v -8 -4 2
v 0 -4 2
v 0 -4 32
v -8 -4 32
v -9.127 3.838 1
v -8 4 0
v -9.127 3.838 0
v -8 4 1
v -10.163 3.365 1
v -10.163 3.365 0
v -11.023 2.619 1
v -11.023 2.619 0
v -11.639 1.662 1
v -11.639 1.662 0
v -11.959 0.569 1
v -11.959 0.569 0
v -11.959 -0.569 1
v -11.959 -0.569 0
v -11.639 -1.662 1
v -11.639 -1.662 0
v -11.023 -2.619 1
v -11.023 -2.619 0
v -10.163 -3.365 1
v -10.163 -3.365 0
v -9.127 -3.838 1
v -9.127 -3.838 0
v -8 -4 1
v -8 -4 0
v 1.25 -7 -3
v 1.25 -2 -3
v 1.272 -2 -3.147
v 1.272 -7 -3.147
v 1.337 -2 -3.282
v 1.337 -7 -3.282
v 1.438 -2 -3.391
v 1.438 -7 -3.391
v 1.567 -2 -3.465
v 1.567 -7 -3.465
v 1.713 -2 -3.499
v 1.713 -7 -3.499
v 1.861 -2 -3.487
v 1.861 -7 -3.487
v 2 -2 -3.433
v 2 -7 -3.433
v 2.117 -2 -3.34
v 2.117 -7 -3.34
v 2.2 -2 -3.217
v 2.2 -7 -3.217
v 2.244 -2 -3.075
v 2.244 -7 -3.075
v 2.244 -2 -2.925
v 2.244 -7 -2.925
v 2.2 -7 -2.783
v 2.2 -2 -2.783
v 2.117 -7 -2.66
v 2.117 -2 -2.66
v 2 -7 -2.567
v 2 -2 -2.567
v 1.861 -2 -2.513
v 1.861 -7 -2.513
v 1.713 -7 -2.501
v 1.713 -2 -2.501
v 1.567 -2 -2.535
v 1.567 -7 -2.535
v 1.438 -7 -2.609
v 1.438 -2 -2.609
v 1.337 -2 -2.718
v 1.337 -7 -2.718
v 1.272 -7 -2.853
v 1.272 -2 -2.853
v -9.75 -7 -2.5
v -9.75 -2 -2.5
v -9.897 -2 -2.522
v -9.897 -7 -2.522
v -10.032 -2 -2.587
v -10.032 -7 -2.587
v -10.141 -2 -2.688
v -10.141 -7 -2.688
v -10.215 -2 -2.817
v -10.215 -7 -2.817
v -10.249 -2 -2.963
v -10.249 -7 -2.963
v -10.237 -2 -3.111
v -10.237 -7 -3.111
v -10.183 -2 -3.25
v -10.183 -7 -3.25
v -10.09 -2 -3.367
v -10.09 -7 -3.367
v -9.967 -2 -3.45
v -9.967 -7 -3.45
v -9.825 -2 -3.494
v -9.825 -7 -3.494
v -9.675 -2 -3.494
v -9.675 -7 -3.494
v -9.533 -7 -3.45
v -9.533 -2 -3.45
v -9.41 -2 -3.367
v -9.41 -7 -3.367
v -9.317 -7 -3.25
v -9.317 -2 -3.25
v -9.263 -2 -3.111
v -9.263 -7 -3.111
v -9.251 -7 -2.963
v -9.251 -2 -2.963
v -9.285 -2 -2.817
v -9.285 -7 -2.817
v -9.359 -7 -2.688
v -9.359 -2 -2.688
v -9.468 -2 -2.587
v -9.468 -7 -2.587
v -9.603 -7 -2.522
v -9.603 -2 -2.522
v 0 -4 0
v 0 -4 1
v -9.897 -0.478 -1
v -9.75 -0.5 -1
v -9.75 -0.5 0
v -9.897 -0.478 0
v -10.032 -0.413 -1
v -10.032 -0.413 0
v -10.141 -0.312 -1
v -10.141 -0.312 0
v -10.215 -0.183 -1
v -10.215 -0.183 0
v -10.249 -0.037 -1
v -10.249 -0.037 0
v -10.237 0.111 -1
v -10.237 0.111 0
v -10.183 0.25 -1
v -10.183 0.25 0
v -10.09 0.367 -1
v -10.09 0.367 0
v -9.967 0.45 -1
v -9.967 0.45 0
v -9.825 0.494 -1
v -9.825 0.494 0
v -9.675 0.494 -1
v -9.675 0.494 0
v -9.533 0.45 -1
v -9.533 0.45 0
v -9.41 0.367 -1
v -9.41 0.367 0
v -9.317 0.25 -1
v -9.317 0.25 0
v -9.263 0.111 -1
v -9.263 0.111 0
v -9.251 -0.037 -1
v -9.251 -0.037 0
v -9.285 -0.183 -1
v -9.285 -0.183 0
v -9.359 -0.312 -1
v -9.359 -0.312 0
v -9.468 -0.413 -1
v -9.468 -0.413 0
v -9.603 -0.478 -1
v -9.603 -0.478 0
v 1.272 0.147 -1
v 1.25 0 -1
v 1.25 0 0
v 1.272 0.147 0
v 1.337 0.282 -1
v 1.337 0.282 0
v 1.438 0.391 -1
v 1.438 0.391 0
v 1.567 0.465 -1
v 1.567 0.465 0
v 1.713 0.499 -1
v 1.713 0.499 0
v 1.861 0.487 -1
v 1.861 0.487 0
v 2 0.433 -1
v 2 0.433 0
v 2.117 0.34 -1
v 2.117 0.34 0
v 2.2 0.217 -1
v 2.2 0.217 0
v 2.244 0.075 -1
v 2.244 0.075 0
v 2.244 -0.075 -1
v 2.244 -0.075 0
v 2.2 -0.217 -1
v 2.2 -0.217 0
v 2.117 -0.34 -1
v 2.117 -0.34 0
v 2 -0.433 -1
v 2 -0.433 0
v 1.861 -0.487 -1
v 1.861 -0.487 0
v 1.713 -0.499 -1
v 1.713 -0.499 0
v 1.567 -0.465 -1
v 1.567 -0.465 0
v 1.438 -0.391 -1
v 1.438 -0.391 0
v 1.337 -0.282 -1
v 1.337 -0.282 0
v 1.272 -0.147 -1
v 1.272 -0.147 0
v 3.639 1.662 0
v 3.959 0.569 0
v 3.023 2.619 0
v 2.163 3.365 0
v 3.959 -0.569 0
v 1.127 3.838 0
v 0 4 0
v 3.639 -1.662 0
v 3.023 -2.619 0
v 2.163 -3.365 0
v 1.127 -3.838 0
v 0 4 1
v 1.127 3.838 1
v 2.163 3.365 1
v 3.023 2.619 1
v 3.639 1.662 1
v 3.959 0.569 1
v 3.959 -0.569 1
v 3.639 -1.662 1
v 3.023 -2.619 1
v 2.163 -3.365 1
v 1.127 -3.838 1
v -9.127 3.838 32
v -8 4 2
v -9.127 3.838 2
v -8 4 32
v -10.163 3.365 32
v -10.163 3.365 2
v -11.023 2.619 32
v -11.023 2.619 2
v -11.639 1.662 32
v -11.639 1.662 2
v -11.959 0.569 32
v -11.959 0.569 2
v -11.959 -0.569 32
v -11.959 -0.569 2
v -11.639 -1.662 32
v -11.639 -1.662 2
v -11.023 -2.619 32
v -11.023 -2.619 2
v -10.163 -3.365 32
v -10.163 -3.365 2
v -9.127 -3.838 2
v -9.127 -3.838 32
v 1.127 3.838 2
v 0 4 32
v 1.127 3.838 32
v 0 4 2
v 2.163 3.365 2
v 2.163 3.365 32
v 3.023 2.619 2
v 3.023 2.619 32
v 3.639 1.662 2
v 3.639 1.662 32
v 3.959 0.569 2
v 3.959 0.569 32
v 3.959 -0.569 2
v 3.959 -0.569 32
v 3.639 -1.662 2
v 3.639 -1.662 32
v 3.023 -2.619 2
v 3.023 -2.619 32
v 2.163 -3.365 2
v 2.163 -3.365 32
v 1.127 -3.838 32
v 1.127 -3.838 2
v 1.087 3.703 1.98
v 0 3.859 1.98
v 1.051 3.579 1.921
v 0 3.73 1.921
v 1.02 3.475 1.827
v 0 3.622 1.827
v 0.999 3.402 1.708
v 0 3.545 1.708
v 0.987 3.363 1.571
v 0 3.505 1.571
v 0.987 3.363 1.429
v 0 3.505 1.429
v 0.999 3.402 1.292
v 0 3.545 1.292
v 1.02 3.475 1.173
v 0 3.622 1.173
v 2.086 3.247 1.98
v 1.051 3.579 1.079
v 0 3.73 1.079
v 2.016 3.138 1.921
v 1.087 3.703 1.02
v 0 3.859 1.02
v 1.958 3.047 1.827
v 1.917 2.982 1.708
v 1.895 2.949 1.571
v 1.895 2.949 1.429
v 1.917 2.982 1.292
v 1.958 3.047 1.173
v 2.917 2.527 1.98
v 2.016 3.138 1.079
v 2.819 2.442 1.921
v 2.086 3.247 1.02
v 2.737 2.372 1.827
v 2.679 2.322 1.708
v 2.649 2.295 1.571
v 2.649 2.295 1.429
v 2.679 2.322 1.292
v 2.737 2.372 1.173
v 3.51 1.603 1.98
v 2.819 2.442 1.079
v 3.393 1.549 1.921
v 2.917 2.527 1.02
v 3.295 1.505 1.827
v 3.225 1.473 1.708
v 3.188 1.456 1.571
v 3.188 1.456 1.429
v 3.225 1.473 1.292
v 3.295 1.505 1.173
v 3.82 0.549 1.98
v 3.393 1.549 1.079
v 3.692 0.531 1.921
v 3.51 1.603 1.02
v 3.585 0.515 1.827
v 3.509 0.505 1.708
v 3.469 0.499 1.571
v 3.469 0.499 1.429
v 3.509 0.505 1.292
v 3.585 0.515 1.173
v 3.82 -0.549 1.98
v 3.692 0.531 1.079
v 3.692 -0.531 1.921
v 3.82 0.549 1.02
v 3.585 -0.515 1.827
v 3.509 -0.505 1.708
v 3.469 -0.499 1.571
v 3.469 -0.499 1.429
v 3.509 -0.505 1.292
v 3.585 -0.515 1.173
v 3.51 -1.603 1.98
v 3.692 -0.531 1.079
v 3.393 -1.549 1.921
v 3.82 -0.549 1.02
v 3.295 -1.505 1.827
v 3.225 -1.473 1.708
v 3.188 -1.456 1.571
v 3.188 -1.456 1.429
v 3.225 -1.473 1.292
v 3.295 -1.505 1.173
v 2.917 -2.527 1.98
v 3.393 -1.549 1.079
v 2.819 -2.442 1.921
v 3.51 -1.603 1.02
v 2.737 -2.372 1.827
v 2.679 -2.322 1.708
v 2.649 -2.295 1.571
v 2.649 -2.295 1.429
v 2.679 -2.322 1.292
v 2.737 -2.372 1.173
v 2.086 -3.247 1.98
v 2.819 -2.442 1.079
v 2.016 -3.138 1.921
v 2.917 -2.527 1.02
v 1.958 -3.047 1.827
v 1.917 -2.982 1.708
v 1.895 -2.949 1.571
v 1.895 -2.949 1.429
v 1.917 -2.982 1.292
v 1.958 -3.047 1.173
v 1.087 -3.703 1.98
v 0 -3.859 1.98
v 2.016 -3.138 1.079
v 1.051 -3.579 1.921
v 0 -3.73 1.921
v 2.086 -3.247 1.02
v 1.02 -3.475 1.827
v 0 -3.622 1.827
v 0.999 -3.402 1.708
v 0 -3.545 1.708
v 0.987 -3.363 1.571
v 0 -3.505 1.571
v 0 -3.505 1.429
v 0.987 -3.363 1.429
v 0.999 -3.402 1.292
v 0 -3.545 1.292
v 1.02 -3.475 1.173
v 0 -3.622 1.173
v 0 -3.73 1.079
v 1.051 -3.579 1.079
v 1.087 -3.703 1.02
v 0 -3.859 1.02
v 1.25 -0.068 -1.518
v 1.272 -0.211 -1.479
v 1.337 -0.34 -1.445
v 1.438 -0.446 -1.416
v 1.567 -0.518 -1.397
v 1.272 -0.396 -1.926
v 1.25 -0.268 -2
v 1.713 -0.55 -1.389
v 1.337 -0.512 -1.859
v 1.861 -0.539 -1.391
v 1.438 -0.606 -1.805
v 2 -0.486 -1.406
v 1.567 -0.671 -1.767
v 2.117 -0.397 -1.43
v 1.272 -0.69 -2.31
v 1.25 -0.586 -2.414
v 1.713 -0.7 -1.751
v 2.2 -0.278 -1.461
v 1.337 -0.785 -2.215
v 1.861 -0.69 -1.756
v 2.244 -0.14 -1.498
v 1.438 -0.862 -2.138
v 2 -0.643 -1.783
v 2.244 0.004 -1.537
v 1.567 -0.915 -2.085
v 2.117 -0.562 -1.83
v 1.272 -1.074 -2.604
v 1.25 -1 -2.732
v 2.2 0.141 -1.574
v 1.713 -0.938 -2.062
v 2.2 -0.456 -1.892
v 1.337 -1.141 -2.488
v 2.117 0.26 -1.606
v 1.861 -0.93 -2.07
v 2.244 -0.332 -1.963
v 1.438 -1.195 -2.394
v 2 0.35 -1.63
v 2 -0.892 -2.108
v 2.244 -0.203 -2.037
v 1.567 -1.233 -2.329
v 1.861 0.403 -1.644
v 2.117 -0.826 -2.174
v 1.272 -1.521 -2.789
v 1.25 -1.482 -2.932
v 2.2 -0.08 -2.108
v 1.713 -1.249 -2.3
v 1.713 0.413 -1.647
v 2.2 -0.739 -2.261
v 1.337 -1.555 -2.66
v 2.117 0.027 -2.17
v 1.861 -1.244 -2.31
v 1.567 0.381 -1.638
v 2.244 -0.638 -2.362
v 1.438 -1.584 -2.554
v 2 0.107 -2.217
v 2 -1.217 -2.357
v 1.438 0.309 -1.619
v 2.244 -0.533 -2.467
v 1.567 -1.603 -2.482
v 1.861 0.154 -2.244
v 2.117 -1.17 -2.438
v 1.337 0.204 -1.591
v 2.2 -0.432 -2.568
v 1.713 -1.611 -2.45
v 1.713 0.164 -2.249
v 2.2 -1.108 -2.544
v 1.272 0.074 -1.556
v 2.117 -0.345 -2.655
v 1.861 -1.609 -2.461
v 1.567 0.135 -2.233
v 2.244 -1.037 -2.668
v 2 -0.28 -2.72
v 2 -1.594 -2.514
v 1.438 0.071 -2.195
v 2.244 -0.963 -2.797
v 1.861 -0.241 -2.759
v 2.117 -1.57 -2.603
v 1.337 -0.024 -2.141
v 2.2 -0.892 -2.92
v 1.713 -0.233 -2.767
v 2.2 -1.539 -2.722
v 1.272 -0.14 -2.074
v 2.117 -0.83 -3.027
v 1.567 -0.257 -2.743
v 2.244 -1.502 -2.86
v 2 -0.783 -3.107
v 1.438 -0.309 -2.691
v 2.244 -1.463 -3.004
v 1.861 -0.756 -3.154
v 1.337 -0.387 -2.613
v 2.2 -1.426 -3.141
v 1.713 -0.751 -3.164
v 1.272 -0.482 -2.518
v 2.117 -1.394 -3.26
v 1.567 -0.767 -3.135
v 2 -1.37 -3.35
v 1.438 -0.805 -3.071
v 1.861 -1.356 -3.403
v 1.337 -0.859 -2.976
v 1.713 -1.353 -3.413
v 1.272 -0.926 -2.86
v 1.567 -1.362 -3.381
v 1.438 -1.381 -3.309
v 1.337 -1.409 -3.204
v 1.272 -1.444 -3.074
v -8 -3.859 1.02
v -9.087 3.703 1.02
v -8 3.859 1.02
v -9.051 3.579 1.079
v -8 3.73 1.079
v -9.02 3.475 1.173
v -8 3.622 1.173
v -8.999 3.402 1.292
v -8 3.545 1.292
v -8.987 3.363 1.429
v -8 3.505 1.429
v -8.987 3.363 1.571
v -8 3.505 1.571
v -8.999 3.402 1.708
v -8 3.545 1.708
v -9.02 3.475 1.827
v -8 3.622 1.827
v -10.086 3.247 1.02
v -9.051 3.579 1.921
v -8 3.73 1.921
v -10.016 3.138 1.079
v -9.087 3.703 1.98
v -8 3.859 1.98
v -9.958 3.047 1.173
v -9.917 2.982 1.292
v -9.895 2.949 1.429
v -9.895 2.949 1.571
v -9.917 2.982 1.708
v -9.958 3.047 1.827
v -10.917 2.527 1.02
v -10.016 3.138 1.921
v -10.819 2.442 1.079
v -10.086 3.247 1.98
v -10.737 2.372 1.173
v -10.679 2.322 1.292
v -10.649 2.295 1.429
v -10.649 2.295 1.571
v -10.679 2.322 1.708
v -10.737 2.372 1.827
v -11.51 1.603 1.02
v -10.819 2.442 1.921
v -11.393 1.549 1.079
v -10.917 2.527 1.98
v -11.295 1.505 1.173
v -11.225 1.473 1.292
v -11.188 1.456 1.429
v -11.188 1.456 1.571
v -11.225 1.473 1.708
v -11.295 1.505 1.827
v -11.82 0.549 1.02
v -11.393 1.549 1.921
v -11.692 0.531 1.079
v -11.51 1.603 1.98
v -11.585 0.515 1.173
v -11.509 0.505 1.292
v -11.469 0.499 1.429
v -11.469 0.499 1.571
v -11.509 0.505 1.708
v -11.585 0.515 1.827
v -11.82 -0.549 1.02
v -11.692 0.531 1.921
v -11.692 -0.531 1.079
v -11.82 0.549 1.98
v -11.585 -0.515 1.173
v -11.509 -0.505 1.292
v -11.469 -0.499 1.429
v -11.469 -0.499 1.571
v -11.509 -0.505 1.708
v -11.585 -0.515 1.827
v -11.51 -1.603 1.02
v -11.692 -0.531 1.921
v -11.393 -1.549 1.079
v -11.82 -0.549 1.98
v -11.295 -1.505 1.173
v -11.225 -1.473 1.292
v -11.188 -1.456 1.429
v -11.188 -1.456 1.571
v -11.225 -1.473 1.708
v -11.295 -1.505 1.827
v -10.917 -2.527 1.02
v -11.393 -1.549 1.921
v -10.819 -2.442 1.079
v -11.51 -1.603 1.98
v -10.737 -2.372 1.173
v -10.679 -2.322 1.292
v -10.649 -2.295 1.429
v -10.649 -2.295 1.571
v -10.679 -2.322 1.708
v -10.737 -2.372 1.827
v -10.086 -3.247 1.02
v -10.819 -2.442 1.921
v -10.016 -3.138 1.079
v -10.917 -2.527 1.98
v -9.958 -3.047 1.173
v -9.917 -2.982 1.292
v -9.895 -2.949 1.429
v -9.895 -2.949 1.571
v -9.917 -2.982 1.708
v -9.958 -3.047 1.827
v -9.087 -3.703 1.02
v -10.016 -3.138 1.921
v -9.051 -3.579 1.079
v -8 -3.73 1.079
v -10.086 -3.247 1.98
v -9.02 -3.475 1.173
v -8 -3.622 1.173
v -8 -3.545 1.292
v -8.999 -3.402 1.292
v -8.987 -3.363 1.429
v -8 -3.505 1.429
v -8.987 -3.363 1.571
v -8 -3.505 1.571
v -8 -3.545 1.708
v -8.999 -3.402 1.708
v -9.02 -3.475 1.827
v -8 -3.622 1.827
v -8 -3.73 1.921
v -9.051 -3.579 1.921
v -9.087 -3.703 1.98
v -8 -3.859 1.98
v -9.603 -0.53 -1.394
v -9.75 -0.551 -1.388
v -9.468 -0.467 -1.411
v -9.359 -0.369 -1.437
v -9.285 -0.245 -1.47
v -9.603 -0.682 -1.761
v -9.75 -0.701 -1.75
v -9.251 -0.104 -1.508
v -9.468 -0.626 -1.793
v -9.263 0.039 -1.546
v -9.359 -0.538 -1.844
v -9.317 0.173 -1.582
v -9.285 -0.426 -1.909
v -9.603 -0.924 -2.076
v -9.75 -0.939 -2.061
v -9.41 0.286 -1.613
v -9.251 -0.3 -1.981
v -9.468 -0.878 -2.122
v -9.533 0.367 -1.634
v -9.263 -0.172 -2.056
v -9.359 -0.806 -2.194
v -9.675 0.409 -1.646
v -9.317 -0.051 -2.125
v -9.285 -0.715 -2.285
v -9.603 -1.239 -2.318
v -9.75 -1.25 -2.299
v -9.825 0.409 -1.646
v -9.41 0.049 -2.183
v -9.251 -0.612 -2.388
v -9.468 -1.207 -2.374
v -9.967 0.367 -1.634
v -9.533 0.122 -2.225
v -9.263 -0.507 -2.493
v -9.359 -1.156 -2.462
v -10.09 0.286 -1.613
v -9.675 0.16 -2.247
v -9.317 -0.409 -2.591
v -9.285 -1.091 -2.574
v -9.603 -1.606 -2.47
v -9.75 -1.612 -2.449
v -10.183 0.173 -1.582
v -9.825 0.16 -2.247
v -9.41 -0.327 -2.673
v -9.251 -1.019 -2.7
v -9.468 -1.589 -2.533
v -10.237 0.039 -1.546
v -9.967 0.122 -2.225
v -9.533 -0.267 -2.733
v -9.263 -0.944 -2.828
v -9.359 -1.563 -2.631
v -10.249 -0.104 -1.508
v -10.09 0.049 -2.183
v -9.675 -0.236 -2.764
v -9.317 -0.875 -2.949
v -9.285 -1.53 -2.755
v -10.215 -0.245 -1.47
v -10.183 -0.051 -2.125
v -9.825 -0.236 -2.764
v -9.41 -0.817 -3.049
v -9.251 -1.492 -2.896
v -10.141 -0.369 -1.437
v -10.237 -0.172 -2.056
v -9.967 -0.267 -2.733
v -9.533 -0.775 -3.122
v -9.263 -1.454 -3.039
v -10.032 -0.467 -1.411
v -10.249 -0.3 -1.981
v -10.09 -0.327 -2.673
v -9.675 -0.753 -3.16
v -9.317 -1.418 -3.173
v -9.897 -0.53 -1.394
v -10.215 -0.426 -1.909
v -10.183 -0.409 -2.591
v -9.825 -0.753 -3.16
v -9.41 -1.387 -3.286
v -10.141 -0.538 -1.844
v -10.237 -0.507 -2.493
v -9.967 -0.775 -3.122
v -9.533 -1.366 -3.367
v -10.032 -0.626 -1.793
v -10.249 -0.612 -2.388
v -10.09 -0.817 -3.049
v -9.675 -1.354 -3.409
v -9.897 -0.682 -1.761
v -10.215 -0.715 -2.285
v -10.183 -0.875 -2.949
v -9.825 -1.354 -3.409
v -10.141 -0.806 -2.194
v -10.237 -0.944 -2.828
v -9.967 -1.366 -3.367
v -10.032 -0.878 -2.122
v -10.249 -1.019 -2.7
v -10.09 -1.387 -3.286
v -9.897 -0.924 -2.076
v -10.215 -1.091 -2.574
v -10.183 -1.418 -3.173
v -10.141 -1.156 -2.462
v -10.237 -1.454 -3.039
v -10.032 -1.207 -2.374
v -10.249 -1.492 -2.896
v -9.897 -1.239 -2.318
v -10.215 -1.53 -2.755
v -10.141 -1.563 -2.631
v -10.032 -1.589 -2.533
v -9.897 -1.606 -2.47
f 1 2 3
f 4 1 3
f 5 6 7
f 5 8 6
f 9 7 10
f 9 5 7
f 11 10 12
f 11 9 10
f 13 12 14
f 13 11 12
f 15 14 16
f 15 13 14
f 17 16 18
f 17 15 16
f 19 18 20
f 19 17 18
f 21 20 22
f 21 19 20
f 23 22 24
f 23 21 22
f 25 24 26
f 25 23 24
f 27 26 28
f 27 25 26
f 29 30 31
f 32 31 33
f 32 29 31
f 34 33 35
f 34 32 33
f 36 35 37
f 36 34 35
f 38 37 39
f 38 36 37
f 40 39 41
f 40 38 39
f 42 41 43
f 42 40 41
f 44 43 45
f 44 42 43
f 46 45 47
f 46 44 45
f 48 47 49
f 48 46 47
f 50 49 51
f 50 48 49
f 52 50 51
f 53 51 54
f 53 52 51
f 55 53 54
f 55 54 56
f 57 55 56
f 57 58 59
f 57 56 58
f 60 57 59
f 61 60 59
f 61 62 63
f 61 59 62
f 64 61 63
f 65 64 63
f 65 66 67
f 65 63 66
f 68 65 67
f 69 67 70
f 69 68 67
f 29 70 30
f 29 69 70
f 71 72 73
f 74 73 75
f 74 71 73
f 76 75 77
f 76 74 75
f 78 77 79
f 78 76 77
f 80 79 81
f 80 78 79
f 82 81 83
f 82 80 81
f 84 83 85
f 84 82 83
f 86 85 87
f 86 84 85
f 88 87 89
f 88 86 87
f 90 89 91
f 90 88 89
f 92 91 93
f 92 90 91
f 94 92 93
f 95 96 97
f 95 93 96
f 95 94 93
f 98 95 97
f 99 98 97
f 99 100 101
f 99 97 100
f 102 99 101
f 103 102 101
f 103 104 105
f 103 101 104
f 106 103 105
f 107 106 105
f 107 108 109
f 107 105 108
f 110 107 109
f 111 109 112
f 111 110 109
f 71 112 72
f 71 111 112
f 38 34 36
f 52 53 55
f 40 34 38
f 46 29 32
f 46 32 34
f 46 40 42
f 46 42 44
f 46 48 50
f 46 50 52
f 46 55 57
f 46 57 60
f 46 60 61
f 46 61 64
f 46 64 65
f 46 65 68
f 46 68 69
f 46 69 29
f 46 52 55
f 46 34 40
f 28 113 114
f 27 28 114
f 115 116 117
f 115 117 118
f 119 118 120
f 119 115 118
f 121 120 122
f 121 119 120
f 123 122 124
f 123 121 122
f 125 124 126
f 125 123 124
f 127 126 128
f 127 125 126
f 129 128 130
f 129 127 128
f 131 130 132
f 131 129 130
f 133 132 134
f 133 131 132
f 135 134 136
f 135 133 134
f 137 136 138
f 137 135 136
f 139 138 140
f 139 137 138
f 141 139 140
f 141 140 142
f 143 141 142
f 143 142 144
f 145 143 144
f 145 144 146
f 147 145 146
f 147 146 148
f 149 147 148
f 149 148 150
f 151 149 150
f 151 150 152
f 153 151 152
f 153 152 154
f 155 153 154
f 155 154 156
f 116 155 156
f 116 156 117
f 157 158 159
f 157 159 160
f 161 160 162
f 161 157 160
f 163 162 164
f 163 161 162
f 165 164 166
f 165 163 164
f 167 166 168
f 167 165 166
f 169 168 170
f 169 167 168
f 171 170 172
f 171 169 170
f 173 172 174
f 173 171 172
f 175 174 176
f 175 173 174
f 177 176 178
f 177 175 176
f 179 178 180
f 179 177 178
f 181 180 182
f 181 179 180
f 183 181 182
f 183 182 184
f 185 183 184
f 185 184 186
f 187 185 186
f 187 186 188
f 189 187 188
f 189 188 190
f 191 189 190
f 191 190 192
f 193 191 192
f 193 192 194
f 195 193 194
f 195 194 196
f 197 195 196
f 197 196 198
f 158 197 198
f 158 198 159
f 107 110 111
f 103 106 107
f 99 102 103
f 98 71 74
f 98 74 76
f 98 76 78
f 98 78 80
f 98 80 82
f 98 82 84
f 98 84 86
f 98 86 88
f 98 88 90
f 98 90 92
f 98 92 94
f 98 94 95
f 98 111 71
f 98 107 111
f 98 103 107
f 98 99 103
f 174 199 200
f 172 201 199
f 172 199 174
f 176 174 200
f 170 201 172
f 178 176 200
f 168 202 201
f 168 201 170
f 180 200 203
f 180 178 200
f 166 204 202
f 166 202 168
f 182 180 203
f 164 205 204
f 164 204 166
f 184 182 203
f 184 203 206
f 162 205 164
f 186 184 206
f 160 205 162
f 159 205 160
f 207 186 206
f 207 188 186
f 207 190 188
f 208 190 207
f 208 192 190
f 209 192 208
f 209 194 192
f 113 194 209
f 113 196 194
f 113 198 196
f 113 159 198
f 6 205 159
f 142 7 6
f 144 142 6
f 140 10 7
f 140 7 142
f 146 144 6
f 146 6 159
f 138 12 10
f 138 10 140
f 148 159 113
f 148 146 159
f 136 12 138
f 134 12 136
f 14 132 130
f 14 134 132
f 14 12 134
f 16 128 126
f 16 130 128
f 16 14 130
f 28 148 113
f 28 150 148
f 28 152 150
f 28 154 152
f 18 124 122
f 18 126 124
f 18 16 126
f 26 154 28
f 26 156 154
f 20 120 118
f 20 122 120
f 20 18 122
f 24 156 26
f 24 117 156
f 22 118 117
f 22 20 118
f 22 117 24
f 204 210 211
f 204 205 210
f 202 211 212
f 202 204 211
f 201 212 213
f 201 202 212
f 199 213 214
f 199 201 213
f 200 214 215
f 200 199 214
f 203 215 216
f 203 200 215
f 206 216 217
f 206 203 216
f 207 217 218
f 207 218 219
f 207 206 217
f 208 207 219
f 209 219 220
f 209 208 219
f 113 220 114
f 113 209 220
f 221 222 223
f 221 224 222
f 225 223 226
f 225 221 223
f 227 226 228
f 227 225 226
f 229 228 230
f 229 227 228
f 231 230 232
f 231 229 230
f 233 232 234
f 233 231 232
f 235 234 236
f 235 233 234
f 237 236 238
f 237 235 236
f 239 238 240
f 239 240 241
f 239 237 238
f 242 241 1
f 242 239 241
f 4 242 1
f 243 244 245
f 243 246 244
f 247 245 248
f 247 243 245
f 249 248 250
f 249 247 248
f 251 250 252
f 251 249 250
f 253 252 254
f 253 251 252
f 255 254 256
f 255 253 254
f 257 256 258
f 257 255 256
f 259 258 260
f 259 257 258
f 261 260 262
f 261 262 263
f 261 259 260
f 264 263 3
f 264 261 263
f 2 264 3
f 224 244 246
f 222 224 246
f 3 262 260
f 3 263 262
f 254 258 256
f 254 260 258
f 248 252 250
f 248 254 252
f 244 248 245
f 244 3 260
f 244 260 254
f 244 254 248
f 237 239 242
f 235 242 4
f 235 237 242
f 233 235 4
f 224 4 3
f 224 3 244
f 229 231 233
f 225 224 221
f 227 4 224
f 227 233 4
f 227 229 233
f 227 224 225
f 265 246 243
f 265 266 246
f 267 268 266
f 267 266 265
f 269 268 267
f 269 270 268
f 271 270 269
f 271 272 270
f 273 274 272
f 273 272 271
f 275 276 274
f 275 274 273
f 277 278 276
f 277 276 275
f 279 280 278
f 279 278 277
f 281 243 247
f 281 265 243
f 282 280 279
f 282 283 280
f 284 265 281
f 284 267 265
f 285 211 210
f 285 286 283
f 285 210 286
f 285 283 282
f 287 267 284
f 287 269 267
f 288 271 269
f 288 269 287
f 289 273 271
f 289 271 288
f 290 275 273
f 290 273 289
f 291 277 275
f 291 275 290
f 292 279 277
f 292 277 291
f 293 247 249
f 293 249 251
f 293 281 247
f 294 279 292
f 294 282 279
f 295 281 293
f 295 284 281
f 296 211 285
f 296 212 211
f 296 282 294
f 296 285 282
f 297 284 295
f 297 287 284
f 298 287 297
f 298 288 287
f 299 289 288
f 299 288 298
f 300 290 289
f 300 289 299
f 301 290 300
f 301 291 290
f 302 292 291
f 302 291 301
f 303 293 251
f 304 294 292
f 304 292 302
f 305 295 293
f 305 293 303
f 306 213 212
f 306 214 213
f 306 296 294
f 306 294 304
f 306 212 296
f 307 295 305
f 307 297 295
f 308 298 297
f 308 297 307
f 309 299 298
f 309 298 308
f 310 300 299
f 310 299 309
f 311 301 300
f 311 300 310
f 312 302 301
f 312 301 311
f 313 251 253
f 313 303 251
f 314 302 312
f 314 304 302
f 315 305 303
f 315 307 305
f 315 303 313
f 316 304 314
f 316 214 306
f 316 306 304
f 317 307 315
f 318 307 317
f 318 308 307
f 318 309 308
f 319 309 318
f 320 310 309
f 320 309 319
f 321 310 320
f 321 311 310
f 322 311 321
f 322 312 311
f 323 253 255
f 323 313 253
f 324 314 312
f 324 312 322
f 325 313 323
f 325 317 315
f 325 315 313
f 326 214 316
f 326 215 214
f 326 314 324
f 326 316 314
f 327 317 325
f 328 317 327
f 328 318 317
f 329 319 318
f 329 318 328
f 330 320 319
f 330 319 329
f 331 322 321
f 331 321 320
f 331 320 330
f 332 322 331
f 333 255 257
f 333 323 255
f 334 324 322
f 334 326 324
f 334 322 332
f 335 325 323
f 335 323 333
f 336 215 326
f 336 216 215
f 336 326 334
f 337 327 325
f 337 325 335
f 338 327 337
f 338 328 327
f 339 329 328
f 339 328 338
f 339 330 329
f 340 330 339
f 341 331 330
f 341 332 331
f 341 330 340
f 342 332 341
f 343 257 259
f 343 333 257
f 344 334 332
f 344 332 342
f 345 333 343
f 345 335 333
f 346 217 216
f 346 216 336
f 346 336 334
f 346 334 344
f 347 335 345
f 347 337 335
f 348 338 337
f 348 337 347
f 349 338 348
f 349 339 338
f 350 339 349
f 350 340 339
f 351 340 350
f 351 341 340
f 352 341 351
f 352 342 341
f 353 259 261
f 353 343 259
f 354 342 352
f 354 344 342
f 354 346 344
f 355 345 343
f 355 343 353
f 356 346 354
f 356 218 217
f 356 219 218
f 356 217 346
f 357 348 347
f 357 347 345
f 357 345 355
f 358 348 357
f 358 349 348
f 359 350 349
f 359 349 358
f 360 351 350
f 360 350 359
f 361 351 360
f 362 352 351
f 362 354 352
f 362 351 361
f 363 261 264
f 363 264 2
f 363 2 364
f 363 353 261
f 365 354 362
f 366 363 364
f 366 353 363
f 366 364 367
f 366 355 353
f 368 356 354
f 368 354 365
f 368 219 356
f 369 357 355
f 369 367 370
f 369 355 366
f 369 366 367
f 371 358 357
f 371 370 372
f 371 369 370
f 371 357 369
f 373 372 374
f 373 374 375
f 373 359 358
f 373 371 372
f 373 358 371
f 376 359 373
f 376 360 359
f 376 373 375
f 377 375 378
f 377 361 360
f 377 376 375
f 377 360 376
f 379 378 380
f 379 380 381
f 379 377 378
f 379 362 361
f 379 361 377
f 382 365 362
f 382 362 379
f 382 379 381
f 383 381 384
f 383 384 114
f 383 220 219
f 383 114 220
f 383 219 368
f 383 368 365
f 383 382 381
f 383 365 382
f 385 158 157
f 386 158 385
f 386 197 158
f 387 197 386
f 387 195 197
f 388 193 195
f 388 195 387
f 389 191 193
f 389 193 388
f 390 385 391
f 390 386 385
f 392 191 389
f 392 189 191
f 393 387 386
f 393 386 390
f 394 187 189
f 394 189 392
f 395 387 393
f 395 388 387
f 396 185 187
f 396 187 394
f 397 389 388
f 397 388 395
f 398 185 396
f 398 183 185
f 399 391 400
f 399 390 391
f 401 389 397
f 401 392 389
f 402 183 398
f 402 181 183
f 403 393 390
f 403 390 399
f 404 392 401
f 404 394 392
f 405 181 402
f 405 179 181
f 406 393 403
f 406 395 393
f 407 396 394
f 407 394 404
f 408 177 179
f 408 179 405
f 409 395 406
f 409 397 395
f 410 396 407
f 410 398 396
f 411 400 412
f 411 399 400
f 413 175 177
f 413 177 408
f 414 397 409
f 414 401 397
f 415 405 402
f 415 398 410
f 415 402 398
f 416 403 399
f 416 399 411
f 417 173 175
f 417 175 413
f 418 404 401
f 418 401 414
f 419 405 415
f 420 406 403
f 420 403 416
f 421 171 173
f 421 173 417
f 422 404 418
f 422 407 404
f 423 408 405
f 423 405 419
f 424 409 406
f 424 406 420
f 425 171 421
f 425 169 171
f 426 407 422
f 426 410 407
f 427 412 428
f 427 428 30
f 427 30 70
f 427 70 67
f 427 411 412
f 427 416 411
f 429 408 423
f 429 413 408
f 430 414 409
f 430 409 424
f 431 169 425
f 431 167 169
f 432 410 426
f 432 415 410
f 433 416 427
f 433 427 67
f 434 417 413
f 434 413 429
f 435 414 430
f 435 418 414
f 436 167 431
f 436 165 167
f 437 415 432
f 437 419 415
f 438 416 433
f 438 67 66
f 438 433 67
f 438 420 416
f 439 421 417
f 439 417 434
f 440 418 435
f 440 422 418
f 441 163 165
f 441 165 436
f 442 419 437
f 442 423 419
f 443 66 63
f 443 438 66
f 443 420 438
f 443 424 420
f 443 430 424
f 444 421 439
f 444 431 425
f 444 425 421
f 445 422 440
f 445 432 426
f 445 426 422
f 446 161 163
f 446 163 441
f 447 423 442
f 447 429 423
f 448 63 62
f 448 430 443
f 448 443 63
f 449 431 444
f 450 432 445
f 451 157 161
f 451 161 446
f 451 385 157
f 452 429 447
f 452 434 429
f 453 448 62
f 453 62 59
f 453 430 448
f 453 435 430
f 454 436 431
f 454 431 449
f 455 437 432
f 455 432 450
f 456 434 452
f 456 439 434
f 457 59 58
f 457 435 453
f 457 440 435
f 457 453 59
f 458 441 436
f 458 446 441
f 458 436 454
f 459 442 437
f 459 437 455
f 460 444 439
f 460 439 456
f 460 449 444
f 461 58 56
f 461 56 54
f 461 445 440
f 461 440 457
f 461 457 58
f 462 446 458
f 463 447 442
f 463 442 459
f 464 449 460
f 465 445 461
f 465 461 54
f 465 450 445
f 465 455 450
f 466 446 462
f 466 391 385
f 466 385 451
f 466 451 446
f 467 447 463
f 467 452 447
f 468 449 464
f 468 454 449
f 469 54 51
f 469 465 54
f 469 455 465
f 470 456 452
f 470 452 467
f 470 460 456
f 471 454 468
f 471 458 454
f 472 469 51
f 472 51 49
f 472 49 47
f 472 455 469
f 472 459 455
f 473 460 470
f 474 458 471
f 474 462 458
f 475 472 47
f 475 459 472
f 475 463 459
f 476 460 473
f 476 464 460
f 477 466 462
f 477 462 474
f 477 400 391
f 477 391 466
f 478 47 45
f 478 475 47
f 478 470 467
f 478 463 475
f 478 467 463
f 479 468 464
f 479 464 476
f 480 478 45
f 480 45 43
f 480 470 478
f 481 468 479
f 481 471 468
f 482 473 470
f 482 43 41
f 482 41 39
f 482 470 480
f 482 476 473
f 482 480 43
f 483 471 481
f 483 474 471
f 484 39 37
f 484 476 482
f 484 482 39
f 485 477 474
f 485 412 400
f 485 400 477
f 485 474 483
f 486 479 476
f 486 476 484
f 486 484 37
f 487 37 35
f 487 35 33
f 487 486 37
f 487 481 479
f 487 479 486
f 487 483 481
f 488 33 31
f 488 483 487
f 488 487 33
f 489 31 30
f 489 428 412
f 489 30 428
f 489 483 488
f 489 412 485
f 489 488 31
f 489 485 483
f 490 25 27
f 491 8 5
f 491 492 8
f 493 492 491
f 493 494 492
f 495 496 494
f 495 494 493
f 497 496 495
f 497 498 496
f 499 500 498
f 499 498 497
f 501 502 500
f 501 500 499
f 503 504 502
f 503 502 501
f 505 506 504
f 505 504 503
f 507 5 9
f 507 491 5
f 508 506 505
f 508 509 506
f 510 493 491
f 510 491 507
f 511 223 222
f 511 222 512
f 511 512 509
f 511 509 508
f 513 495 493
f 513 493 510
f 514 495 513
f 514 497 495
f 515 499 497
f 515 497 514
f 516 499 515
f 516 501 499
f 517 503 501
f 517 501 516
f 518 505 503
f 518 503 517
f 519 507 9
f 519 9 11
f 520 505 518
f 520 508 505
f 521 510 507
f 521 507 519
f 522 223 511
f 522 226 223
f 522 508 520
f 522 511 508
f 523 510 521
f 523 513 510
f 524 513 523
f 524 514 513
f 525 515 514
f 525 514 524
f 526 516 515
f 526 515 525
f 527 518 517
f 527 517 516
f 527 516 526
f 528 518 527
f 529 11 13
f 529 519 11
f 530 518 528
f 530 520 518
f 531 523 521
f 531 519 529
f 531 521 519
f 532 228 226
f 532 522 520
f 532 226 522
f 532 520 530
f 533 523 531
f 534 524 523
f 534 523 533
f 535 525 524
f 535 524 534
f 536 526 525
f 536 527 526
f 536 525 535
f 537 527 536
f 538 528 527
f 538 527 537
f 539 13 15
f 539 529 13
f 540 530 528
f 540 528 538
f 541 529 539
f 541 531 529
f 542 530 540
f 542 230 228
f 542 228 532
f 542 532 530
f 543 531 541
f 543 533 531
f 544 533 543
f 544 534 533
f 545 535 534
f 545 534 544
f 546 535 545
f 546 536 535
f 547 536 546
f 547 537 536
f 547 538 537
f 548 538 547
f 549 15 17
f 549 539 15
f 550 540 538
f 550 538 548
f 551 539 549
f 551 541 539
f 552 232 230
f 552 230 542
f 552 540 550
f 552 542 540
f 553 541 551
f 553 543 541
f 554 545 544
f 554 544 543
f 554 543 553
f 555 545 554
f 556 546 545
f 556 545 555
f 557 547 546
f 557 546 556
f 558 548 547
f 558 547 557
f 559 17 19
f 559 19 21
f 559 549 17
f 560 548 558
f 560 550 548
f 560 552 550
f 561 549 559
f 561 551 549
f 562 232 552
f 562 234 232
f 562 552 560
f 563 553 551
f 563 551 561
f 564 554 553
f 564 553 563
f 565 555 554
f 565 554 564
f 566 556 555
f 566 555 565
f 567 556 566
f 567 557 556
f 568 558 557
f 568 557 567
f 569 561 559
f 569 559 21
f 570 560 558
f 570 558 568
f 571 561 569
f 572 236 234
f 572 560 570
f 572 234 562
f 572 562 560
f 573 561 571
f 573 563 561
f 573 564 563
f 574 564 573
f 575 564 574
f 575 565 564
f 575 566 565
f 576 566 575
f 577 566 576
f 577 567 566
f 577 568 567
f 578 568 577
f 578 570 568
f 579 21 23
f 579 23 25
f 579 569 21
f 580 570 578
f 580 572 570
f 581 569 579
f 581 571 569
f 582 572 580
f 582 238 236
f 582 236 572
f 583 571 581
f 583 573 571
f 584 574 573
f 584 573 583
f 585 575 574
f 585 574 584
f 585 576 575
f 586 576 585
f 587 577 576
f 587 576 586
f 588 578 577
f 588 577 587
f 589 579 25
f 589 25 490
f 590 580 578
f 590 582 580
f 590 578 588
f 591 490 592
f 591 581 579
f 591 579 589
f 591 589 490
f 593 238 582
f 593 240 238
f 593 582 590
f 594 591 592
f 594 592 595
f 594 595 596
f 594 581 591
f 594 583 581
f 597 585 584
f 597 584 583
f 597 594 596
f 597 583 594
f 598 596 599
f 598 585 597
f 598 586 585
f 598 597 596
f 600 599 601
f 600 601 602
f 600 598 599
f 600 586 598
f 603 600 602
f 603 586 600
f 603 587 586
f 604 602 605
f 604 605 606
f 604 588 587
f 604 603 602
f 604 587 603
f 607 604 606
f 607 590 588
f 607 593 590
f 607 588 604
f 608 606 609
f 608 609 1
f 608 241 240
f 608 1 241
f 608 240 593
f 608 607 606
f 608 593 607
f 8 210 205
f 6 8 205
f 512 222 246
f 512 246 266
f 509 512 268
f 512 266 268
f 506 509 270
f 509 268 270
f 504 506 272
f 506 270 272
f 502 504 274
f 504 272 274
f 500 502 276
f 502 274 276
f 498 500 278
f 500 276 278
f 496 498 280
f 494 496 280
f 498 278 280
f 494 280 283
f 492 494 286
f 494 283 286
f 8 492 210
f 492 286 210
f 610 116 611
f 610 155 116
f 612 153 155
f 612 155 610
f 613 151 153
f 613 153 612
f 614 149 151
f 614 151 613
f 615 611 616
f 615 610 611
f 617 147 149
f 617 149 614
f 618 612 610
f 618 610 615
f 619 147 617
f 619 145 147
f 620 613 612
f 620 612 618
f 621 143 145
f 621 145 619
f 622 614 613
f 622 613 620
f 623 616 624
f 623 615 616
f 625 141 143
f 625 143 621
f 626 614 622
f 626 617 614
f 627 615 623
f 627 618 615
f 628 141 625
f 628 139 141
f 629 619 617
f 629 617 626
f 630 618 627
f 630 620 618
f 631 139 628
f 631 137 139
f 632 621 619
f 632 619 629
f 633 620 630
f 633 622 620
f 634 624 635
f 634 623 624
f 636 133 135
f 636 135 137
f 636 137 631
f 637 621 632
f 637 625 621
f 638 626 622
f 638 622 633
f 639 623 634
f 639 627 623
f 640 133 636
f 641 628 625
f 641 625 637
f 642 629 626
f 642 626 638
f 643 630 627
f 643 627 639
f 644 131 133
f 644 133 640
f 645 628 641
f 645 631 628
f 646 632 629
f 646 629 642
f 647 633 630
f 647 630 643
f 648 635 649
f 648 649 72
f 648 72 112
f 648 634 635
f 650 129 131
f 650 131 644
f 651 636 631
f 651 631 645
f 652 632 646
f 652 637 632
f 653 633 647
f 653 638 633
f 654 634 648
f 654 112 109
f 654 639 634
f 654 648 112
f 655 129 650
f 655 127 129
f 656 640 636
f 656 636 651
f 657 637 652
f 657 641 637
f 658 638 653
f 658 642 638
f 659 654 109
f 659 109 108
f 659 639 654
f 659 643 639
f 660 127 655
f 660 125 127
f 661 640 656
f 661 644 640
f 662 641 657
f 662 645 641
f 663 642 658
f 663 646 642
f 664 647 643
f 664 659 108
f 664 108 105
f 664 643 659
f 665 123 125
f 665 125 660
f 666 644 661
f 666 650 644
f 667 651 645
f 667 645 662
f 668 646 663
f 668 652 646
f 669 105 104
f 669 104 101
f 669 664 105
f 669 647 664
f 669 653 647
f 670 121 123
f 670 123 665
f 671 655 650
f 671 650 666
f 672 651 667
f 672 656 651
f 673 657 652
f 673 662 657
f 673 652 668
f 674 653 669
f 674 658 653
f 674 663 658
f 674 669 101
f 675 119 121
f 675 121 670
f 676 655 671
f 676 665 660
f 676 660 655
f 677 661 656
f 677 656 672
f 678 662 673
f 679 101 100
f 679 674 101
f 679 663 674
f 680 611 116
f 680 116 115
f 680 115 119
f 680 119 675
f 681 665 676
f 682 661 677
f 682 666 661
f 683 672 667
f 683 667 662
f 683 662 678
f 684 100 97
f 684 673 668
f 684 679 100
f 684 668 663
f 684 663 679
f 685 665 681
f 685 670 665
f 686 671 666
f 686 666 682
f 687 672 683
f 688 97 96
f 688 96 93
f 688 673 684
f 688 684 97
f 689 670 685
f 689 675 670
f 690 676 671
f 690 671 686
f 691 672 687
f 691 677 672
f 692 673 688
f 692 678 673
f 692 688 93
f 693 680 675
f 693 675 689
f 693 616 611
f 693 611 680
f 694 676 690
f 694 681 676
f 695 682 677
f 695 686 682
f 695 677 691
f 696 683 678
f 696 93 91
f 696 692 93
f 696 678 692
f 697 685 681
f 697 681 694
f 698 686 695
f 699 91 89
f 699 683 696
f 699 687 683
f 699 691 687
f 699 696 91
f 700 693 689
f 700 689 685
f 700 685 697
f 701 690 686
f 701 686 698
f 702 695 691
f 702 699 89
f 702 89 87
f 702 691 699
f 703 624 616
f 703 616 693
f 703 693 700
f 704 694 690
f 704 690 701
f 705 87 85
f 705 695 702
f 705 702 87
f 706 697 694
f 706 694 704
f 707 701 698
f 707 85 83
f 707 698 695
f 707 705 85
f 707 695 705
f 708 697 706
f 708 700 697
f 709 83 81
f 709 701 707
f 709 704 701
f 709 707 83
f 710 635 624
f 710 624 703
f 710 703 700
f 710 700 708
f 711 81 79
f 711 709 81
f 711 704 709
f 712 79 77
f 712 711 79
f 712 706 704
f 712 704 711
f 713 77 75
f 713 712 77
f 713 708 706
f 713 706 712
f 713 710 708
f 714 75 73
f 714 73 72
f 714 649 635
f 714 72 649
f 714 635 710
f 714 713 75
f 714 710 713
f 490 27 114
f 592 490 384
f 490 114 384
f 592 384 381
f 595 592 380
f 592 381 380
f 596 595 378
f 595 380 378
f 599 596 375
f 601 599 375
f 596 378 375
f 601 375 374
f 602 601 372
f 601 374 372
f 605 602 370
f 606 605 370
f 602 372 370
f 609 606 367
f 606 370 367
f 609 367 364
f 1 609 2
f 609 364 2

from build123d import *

# Parameters (mm, degrees)
REVOLVE1_ANGLE      = 180
BOSS_EXTRUDE2_DEPTH = 8
REVOLVE2_ANGLE      = 180
SWEEP1_PROFILE_R    = 0.5
SWEEP2_PROFILE_R    = 0.5


with BuildPart() as part:
    # Sketch3 → Revolve1 (revolve)
    with BuildSketch(Plane(origin=(0, 0, 0), x_dir=(0, 0, -1), z_dir=(1, 0, 0))):
        with BuildLine():
            Line((-32, 4), (-2, 4))
            ThreePointArc((-2, 4), (-1.5, 3.5), (-1, 4))
            Line((-1, 4), (0, 4))
            Line((0, 4), (0, 0))
            Line((0, 0), (-32, 0))
            Line((-32, 0), (-32, 4))
        make_face()
    revolve(axis=Axis((0, 0, 32.603933811), (0, 0, -1)), revolution_arc=REVOLVE1_ANGLE)

    # Sketch4 → Boss-Extrude2 (add)
    with BuildSketch(Plane.ZY):
        with BuildLine():
            Line((0, 4), (0, -4))
            Line((0, -4), (1, -4))
            ThreePointArc((1, -4), (1.5, -3.5), (2, -4))
            Line((2, -4), (32, -4))
            Line((32, -4), (32, 4))
            Line((32, 4), (2, 4))
            ThreePointArc((2, 4), (1.5, 3.5), (1, 4))
            Line((1, 4), (0, 4))
        make_face()
    extrude(amount=BOSS_EXTRUDE2_DEPTH)

    # Sketch5 → Revolve2 (revolve)
    with BuildSketch(Plane.ZY.offset(8)):
        with BuildLine():
            Line((0, 0), (0, 4))
            Line((0, 4), (1, 4))
            ThreePointArc((1, 4), (1.5, 3.5), (2, 4))
            Line((2, 4), (32, 4))
            Line((32, 4), (32, 0))
            Line((32, 0), (0, 0))
        make_face()
    revolve(axis=Axis((-8, 0, -3.043909687), (0, 0, 1)), revolution_arc=REVOLVE2_ANGLE)

    # Sweep1: sweep along a path in Sketch7
    with BuildLine(Plane(origin=(1.75, 0, 0), x_dir=(0, 0, -1), z_dir=(1, 0, 0))) as sweep1_path:
        Line((0, 0), (1, 0))
        ThreePointArc((1, 0), (2.414213562, -0.585786438), (3, -2))
        Line((3, -2), (3, -7))
    # Sweep1 profile (on start of the path) → Sweep1 (sweep)
    with BuildSketch(Plane(origin=(1.75, 0, 0), x_dir=(-1, 0, 0), z_dir=(0, 0, -1))):
        Circle(SWEEP1_PROFILE_R)
    sweep(path=sweep1_path.line)

    # Sweep2: sweep along a path in Sketch14
    with BuildLine(Plane.ZY.offset(9.75)) as sweep2_path:
        Line((0, 0), (-1, 0))
        ThreePointArc((-1, 0), (-2.414213562, -0.585786438), (-3, -2))
        Line((-3, -2), (-3, -7))
    # Sweep2 profile (on start of the path) → Sweep2 (sweep)
    with BuildSketch(Plane(origin=(-9.75, 0, 0), x_dir=(0, -1, 0), z_dir=(0, 0, -1))):
        Circle(SWEEP2_PROFILE_R)
    sweep(path=sweep2_path.line)


solid = part.part
